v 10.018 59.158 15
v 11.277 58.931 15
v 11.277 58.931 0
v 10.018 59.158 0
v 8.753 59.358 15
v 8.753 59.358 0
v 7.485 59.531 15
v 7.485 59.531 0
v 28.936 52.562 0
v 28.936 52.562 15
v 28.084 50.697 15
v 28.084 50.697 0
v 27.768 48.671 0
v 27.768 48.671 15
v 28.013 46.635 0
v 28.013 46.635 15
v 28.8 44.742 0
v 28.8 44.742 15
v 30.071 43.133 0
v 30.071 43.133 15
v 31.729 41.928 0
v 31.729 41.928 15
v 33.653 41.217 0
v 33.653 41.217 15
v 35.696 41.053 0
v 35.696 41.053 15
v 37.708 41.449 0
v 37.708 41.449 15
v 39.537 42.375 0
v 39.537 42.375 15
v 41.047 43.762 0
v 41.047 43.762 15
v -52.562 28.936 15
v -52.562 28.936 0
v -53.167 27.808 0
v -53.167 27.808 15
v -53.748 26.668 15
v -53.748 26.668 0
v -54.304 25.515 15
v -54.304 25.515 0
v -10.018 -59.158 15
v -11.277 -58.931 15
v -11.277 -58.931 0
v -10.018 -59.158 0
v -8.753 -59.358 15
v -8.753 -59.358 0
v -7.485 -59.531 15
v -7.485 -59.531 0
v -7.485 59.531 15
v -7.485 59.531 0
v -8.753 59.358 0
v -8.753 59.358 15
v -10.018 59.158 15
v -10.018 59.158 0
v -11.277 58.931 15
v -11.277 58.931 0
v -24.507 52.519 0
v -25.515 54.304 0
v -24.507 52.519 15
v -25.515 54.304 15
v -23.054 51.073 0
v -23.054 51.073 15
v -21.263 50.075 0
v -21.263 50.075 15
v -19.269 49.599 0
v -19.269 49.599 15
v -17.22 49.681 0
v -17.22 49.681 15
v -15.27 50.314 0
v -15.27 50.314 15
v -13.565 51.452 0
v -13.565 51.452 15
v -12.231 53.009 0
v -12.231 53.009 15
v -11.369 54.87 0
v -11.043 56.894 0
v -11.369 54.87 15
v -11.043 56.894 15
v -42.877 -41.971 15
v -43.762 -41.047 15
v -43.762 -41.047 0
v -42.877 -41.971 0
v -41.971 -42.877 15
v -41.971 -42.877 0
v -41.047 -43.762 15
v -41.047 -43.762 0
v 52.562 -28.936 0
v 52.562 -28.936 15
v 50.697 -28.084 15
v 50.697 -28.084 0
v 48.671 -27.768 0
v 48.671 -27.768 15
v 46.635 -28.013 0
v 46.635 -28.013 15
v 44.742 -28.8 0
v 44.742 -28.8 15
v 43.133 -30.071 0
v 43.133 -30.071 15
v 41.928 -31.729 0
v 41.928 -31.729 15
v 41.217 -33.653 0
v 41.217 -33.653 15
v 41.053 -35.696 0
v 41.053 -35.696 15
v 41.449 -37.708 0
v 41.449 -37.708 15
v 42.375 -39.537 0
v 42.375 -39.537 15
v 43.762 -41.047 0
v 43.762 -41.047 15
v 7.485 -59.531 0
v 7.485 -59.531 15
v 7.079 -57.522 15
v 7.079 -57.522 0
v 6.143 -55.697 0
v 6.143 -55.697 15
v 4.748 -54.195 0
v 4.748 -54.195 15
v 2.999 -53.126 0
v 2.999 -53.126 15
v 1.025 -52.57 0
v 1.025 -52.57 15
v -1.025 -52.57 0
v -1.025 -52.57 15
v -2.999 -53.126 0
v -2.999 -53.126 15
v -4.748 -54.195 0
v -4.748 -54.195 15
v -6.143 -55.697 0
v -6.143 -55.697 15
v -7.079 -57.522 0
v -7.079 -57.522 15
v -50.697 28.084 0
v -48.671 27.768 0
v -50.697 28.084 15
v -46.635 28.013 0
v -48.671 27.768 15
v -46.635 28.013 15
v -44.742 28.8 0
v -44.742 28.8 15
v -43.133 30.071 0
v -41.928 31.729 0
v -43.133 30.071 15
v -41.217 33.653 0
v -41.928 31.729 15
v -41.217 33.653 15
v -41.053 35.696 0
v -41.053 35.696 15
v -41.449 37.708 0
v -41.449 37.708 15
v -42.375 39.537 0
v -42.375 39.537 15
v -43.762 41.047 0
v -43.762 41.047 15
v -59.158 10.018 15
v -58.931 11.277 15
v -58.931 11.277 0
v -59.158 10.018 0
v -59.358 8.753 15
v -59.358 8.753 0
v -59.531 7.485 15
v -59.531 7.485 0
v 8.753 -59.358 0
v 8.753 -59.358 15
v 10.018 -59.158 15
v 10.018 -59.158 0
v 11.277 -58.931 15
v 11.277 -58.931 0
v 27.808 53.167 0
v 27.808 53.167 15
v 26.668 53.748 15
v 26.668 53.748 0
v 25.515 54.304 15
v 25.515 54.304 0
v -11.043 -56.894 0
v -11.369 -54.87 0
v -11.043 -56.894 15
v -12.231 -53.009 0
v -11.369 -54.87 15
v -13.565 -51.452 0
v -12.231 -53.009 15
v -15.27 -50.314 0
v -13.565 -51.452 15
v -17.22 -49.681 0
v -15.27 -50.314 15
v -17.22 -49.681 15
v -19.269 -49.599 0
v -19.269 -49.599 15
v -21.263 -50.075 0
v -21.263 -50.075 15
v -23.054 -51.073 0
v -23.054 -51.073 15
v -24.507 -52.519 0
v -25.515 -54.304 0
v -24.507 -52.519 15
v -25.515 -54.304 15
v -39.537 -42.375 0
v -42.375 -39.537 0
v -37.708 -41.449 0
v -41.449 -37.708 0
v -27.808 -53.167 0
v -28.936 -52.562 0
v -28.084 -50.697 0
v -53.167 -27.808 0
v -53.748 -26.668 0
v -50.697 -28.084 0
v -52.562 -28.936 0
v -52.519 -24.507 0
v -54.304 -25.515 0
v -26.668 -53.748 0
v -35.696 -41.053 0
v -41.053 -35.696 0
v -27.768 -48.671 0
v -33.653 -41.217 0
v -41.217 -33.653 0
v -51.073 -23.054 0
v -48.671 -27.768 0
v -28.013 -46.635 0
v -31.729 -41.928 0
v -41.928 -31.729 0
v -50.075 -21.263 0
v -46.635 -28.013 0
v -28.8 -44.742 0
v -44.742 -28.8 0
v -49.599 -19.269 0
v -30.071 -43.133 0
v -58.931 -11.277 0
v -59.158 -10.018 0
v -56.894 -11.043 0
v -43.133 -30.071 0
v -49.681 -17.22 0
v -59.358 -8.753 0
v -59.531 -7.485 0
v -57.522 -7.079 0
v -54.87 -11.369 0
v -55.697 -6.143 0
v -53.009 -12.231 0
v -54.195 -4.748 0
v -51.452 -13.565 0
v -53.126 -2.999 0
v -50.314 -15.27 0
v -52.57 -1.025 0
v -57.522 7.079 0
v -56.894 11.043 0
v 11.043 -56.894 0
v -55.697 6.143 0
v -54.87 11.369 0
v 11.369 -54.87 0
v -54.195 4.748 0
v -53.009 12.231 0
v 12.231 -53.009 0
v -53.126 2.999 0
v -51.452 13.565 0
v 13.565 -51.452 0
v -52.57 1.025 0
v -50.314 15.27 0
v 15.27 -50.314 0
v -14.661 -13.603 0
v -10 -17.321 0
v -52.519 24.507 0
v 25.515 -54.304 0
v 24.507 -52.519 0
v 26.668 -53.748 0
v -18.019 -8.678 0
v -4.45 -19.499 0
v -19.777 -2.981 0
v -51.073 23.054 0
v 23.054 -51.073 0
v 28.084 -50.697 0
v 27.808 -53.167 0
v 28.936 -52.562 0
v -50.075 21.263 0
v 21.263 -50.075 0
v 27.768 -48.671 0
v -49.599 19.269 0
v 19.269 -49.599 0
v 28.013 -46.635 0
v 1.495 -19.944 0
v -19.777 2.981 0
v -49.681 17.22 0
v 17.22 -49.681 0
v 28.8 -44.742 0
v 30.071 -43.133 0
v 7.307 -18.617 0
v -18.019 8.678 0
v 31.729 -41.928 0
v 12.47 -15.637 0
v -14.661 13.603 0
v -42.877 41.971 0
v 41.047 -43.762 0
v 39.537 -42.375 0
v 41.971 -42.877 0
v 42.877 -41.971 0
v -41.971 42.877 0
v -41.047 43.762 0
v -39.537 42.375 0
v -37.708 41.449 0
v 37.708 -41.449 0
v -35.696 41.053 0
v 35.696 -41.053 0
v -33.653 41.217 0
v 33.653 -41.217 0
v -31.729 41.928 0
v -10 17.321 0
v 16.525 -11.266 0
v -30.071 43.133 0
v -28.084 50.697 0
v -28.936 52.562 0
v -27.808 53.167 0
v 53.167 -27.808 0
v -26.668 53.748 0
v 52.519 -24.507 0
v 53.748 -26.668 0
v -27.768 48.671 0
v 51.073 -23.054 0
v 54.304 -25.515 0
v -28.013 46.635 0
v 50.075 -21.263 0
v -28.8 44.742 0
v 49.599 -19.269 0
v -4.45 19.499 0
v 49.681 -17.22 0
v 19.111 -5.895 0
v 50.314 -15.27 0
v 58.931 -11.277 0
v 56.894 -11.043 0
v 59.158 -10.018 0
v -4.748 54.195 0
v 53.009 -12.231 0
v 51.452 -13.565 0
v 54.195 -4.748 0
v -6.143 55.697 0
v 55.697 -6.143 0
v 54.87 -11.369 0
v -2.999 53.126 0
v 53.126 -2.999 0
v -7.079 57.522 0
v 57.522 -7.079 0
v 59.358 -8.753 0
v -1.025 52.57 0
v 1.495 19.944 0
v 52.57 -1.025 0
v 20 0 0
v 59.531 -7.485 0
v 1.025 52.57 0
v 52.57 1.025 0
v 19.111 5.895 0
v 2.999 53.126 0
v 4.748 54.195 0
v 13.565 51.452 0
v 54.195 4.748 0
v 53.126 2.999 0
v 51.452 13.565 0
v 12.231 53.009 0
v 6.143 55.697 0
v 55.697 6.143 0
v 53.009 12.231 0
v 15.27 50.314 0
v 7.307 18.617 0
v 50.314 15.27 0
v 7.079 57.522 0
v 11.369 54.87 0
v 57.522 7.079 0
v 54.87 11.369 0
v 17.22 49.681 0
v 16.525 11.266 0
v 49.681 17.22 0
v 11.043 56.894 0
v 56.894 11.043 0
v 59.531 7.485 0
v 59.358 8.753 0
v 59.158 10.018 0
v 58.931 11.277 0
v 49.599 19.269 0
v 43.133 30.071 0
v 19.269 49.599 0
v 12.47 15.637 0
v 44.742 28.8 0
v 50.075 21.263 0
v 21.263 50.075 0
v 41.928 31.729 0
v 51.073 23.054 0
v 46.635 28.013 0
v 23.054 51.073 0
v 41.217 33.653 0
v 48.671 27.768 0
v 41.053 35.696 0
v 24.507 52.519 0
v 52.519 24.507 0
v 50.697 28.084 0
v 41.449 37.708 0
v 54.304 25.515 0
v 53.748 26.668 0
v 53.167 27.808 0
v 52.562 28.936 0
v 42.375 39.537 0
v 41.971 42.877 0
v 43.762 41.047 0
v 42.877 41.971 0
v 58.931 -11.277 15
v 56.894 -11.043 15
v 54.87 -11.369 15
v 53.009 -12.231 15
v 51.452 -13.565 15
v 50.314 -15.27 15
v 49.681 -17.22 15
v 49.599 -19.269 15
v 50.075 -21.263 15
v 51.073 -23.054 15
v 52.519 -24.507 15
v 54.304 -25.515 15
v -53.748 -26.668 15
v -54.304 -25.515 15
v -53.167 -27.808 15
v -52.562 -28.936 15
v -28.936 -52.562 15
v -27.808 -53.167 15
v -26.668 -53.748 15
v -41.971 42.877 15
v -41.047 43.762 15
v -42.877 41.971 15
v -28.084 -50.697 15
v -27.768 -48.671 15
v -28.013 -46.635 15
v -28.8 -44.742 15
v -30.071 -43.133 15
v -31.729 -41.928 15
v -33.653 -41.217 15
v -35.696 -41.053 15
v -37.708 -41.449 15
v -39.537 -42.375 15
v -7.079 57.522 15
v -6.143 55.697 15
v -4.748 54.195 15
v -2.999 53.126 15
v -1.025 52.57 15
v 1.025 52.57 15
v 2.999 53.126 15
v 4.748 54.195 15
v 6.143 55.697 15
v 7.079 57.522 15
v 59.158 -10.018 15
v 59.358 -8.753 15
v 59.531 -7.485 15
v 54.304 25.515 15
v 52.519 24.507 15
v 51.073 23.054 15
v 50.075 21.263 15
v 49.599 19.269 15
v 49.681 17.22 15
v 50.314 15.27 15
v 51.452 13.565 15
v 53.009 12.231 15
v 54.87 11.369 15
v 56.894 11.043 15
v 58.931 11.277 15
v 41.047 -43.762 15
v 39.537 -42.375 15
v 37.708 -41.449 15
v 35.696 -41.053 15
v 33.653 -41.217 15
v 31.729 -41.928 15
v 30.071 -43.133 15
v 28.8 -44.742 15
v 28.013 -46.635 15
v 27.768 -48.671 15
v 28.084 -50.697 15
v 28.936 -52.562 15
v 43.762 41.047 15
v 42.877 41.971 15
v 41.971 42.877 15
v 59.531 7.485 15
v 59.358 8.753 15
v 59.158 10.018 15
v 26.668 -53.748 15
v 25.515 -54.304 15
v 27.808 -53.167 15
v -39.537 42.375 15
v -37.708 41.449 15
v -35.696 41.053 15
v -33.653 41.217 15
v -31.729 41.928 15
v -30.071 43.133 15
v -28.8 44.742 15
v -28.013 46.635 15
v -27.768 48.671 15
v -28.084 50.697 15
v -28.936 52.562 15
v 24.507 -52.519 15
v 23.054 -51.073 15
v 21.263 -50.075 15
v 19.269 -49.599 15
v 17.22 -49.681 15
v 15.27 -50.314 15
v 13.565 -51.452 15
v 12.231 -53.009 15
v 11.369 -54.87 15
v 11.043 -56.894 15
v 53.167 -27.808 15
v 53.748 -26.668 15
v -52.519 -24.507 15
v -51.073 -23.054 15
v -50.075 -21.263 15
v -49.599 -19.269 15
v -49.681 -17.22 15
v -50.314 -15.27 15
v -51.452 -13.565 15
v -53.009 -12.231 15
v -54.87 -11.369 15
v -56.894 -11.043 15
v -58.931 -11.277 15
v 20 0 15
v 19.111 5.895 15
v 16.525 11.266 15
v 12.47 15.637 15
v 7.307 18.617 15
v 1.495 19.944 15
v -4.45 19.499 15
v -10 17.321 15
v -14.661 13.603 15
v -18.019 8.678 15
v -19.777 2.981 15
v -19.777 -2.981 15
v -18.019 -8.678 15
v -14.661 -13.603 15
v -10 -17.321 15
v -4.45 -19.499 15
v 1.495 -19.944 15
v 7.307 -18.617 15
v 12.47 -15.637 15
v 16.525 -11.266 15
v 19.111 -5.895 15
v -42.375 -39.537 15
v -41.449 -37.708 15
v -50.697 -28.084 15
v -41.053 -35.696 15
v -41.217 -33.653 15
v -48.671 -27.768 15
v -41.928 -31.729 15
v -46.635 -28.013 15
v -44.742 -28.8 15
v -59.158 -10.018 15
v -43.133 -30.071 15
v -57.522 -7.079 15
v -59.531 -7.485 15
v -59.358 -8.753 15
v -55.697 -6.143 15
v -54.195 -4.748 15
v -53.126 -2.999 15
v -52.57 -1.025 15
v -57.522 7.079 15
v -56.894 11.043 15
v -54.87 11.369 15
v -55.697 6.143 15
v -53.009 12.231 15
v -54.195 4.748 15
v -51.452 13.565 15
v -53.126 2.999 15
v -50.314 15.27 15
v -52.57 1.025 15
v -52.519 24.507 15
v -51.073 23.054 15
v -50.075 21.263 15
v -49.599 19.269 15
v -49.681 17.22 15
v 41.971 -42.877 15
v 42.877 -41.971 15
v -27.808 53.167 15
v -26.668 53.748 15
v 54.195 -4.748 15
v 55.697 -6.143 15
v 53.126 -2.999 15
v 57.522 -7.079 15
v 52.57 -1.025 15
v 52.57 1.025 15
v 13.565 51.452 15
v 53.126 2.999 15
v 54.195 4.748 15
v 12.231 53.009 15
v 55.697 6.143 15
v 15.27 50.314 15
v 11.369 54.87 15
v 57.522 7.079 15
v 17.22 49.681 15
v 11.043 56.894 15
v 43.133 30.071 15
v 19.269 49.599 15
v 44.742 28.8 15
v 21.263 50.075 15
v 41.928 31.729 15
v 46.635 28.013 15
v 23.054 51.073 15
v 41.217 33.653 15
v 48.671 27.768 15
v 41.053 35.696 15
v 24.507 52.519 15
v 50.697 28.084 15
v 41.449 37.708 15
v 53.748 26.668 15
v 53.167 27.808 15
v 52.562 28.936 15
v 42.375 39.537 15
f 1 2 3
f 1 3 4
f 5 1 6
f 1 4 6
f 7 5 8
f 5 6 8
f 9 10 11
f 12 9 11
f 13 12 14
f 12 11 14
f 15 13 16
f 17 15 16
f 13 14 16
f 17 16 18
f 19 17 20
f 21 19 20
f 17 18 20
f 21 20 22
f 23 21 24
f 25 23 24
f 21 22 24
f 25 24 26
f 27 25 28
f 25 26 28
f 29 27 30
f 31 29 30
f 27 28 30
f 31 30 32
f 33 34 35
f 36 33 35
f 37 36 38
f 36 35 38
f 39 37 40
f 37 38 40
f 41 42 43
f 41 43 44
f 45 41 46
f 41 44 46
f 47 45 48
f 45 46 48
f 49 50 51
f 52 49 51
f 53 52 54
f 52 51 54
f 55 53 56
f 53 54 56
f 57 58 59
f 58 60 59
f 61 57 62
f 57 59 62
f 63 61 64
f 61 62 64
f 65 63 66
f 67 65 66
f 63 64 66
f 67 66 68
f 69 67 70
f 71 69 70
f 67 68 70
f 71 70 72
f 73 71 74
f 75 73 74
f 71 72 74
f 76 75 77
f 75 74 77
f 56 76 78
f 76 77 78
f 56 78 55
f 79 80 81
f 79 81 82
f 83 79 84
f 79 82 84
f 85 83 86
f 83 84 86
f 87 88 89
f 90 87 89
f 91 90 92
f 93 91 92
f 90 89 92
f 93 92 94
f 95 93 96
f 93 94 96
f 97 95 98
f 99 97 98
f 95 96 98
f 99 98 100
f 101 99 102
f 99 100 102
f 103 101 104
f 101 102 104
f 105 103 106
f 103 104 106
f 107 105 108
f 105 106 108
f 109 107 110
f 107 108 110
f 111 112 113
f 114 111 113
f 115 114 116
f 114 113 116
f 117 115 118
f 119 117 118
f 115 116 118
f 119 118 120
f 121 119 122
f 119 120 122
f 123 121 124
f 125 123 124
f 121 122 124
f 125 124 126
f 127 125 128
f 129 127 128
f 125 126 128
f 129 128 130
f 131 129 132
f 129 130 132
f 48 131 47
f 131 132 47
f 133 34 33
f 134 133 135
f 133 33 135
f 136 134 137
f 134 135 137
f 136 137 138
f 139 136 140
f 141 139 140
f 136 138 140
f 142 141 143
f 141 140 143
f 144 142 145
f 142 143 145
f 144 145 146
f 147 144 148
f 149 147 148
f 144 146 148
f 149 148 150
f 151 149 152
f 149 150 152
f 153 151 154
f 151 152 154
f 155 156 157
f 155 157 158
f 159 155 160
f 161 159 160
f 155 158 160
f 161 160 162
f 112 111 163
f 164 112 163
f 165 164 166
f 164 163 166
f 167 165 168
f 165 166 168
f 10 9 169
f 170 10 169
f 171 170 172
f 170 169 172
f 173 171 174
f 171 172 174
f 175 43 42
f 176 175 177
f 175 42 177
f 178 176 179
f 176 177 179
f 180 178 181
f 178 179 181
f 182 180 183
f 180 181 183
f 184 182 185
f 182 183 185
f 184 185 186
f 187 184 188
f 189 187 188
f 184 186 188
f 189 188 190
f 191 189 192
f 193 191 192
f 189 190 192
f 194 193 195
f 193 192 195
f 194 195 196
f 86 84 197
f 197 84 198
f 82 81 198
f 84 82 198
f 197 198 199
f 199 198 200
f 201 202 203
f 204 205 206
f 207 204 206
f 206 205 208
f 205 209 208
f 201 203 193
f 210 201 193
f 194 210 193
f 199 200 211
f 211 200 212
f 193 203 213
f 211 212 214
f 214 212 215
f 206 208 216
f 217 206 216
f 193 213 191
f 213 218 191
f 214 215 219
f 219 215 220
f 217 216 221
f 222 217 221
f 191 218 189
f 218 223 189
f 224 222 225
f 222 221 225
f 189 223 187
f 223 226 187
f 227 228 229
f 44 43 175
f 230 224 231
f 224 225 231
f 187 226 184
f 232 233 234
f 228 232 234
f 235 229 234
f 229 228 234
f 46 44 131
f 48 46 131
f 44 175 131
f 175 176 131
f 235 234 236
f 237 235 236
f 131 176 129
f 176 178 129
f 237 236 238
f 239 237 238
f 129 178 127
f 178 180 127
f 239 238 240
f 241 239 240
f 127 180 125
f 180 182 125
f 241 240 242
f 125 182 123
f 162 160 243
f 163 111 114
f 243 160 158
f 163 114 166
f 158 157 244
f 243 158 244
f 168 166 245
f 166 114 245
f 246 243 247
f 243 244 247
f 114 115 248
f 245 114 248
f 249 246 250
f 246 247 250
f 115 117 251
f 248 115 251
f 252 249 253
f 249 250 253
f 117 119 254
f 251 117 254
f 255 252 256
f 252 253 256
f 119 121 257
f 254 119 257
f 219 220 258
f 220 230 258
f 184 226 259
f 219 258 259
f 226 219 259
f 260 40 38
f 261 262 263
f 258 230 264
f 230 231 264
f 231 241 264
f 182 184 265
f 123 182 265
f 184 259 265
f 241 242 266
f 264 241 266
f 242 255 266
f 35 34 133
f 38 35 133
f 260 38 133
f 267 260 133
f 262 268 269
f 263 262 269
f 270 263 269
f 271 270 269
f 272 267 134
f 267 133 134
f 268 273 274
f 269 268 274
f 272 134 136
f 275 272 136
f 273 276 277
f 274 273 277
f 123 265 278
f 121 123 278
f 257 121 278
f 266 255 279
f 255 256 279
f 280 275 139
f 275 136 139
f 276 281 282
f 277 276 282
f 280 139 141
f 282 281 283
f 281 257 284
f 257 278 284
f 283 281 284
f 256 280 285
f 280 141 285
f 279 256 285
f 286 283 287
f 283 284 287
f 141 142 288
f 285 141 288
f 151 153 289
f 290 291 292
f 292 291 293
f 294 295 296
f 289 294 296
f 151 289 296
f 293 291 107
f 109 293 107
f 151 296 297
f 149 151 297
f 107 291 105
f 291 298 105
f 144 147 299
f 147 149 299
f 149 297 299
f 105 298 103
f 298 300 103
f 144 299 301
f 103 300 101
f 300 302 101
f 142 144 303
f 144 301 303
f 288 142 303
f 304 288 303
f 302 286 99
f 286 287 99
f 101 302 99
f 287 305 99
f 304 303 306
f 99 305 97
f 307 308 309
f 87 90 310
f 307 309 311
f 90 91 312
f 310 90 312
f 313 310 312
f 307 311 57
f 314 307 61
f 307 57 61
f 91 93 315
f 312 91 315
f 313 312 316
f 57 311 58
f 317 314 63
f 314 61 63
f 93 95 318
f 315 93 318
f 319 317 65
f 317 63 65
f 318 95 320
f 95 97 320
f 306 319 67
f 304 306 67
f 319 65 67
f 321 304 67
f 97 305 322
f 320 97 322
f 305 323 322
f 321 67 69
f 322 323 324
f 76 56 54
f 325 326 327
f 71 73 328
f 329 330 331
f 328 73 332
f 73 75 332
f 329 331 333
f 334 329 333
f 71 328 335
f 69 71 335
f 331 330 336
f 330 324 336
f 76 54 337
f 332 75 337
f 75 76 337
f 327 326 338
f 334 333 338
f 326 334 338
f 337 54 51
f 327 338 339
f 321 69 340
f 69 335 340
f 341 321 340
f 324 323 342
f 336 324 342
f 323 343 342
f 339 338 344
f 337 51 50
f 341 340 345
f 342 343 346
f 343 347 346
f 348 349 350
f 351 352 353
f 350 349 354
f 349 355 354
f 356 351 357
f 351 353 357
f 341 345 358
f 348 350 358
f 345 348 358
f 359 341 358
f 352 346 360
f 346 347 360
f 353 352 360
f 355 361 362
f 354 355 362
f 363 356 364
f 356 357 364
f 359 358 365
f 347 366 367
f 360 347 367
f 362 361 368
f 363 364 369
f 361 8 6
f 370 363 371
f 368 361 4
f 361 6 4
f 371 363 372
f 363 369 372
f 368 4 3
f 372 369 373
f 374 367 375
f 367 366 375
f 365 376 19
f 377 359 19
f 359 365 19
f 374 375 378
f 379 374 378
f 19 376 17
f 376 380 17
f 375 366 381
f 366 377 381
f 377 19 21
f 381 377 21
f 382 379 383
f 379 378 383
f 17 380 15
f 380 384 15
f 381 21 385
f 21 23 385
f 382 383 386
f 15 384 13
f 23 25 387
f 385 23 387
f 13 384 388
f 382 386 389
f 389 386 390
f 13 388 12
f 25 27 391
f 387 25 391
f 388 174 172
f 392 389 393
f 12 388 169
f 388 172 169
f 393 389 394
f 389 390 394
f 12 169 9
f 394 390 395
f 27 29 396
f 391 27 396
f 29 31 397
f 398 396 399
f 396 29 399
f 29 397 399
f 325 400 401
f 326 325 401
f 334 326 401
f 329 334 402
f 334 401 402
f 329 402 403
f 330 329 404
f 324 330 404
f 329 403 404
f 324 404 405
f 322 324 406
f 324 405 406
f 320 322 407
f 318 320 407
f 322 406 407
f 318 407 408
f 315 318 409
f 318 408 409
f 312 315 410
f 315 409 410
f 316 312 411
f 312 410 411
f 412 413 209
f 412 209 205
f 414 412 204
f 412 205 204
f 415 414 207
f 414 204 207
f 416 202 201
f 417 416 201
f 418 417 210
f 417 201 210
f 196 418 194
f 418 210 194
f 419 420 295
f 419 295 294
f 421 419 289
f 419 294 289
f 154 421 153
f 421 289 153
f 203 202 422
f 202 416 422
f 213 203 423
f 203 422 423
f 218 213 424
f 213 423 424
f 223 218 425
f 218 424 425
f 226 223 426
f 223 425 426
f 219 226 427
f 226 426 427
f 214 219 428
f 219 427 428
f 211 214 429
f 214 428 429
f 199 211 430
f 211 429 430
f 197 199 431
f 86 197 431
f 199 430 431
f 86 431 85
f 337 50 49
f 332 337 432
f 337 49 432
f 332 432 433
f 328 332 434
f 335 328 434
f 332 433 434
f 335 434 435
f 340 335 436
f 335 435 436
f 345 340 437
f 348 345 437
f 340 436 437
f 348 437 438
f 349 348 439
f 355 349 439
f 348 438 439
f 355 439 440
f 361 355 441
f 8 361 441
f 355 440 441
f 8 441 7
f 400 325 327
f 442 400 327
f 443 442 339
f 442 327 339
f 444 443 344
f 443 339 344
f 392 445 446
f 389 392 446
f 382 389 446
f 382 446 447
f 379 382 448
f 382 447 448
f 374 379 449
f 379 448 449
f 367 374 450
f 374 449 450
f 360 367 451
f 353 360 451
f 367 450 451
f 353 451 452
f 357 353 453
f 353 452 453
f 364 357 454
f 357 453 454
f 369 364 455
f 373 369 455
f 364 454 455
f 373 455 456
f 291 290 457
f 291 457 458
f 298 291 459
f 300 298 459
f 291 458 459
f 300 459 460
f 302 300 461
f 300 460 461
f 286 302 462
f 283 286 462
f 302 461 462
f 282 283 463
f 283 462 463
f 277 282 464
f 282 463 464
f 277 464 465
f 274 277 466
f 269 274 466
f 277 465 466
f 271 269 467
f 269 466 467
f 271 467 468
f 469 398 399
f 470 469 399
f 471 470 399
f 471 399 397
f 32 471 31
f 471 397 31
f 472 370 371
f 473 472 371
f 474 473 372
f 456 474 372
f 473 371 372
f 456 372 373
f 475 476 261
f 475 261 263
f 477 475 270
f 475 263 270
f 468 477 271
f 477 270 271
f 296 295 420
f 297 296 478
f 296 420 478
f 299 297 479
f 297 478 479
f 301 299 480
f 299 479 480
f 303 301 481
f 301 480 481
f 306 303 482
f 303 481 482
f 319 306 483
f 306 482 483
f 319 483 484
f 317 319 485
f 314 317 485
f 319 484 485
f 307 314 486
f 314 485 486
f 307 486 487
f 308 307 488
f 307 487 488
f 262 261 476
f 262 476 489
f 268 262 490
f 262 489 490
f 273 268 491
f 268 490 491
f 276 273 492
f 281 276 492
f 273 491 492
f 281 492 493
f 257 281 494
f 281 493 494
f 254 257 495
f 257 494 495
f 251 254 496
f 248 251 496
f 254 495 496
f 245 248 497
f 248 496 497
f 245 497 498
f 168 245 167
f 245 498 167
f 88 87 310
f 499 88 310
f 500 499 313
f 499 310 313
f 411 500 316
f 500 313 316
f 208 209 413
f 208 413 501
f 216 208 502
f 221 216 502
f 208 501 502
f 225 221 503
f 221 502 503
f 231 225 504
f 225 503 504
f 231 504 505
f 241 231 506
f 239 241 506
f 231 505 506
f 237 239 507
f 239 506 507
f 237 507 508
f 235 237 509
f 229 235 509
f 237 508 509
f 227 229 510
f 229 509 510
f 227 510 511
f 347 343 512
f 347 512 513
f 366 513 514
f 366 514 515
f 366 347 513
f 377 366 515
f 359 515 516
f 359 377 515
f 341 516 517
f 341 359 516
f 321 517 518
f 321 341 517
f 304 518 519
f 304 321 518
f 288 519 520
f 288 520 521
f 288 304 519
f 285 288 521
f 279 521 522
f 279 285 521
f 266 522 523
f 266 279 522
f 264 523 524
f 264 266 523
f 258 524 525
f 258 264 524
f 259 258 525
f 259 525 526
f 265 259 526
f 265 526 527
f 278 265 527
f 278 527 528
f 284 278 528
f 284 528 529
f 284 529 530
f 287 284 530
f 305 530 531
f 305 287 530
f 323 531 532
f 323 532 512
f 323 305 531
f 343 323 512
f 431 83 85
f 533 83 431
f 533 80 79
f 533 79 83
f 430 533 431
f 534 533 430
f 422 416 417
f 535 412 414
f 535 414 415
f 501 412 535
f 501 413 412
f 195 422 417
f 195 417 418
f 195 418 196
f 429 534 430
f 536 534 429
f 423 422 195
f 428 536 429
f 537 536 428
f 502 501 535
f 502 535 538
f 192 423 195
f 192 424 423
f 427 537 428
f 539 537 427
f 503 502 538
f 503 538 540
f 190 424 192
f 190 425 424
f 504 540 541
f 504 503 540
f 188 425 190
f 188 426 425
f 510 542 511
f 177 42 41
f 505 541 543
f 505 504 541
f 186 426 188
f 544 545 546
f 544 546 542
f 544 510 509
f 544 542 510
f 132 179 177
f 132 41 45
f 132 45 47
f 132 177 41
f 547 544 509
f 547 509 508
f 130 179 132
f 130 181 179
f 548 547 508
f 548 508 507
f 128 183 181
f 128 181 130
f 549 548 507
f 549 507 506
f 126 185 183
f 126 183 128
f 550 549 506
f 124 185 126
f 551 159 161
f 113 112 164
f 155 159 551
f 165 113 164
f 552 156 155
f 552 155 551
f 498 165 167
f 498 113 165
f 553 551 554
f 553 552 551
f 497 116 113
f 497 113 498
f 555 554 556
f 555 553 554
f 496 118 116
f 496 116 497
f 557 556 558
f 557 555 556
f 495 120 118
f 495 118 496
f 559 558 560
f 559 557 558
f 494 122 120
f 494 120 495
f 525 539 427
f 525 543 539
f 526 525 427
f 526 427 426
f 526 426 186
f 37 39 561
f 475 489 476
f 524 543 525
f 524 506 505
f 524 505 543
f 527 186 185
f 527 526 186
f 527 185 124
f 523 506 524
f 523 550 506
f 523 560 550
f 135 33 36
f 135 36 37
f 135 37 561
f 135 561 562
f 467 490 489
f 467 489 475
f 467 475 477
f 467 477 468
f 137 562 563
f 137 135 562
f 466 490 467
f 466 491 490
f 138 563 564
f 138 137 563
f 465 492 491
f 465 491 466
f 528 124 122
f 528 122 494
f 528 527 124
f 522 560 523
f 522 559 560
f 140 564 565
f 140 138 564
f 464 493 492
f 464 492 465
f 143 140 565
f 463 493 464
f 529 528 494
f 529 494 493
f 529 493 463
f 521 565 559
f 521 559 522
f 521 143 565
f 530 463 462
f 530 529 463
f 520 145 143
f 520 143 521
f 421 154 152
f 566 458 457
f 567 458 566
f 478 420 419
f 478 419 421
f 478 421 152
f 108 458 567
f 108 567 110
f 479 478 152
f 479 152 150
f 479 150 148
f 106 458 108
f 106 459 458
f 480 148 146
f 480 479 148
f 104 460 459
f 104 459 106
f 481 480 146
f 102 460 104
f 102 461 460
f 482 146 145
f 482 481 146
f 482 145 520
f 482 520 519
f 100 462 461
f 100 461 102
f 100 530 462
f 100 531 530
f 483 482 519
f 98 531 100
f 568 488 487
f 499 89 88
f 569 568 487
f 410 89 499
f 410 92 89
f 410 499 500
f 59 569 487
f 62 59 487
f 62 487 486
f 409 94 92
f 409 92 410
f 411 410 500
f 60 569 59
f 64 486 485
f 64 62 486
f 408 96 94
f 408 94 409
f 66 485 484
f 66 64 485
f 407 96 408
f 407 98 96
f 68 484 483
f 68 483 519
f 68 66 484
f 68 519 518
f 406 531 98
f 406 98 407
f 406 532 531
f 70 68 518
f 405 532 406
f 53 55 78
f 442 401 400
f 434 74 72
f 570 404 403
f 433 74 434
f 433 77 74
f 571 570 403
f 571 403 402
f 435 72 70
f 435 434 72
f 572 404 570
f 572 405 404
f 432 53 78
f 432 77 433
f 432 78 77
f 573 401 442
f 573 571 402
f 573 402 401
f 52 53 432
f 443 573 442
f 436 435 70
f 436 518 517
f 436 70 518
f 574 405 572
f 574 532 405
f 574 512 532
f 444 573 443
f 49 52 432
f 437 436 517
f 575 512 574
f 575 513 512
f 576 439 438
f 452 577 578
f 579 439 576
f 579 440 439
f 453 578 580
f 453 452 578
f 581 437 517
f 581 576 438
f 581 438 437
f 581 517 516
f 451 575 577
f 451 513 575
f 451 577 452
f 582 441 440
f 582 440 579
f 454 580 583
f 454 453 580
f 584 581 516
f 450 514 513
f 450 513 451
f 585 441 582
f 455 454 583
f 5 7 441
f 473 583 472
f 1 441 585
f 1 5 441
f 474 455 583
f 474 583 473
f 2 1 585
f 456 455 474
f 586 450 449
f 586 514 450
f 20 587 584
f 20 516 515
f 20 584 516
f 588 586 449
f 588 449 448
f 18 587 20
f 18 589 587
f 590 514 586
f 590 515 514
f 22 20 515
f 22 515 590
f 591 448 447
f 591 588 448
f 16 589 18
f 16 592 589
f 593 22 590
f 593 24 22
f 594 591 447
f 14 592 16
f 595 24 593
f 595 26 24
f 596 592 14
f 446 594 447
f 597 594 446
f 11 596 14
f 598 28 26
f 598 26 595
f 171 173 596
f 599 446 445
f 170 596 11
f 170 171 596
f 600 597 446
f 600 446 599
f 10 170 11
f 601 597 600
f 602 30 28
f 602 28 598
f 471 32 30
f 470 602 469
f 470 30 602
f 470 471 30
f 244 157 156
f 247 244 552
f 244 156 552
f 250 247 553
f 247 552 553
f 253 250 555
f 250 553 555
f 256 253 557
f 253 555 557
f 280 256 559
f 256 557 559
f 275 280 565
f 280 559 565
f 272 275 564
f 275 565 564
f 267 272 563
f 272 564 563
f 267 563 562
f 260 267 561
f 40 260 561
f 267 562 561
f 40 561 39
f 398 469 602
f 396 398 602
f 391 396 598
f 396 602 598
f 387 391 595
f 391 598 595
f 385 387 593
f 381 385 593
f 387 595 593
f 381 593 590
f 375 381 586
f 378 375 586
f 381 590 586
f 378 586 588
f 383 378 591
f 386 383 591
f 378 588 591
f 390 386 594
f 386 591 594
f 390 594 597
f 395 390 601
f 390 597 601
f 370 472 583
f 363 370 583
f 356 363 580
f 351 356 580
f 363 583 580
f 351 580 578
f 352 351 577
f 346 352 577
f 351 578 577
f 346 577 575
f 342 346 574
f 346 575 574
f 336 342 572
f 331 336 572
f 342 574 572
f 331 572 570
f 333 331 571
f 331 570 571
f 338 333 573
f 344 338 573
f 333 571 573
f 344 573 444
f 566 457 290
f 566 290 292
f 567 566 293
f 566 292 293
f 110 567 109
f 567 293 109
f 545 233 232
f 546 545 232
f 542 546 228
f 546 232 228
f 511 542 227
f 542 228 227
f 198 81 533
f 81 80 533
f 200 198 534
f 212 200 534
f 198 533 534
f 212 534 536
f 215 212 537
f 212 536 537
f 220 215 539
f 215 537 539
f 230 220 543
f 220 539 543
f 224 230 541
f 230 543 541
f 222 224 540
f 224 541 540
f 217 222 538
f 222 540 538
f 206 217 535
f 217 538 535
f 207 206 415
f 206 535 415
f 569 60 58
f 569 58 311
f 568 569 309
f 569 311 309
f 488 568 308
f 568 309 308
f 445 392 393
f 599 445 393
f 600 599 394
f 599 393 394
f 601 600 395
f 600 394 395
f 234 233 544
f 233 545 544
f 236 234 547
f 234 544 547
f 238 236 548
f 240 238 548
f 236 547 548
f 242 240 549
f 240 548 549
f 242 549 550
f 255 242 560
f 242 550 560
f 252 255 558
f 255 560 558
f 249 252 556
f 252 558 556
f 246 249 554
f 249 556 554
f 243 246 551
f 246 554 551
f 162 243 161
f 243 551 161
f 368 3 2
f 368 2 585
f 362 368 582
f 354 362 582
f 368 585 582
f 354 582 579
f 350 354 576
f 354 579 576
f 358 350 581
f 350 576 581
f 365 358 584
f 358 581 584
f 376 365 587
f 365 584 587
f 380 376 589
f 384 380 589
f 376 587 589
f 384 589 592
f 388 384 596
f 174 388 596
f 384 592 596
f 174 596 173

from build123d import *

# Parameters (mm, degrees)
SKETCH1_R           = 60
SKETCH1_R_2         = 20
BOSS_EXTRUDE1_DEPTH = 15
SKETCH2_R           = 7.5
CUT_EXTRUDE1_DEPTH  = 15


with BuildPart() as part:
    # Sketch1 → Boss-Extrude1 (new body)
    with BuildSketch(Plane.XY):
        Circle(SKETCH1_R)
        Circle(SKETCH1_R_2, mode=Mode.SUBTRACT)
    extrude(amount=BOSS_EXTRUDE1_DEPTH)

    # Sketch2 → Cut-Extrude1 (cut)
    with BuildSketch(Plane.XY.offset(15)):
        with Locations((0, 60)):
            Circle(SKETCH2_R)
        with Locations((18.541019662, 57.063390978)):
            Circle(SKETCH2_R)
        with Locations((35.267115138, 48.541019663)):
            Circle(SKETCH2_R)
        with Locations((48.541019663, 35.267115138)):
            Circle(SKETCH2_R)
        with Locations((57.063390978, 18.541019663)):
            Circle(SKETCH2_R)
        with Locations((60, 0)):
            Circle(SKETCH2_R)
        with Locations((57.063390978, -18.541019662)):
            Circle(SKETCH2_R)
        with Locations((48.541019663, -35.267115138)):
            Circle(SKETCH2_R)
        with Locations((35.267115138, -48.541019662)):
            Circle(SKETCH2_R)
        with Locations((18.541019663, -57.063390978)):
            Circle(SKETCH2_R)
        with Locations((0, -60)):
            Circle(SKETCH2_R)
        with Locations((-18.541019662, -57.063390978)):
            Circle(SKETCH2_R)
        with Locations((-35.267115138, -48.541019663)):
            Circle(SKETCH2_R)
        with Locations((-48.541019662, -35.267115138)):
            Circle(SKETCH2_R)
        with Locations((-57.063390978, -18.541019663)):
            Circle(SKETCH2_R)
        with Locations((-60, 0)):
            Circle(SKETCH2_R)
        with Locations((-57.063390978, 18.541019662)):
            Circle(SKETCH2_R)
        with Locations((-48.541019662, 35.267115138)):
            Circle(SKETCH2_R)
        with Locations((-35.267115138, 48.541019662)):
            Circle(SKETCH2_R)
        with Locations((-18.541019662, 57.063390978)):
            Circle(SKETCH2_R)
    extrude(amount=-CUT_EXTRUDE1_DEPTH, mode=Mode.SUBTRACT)


solid = part.part
